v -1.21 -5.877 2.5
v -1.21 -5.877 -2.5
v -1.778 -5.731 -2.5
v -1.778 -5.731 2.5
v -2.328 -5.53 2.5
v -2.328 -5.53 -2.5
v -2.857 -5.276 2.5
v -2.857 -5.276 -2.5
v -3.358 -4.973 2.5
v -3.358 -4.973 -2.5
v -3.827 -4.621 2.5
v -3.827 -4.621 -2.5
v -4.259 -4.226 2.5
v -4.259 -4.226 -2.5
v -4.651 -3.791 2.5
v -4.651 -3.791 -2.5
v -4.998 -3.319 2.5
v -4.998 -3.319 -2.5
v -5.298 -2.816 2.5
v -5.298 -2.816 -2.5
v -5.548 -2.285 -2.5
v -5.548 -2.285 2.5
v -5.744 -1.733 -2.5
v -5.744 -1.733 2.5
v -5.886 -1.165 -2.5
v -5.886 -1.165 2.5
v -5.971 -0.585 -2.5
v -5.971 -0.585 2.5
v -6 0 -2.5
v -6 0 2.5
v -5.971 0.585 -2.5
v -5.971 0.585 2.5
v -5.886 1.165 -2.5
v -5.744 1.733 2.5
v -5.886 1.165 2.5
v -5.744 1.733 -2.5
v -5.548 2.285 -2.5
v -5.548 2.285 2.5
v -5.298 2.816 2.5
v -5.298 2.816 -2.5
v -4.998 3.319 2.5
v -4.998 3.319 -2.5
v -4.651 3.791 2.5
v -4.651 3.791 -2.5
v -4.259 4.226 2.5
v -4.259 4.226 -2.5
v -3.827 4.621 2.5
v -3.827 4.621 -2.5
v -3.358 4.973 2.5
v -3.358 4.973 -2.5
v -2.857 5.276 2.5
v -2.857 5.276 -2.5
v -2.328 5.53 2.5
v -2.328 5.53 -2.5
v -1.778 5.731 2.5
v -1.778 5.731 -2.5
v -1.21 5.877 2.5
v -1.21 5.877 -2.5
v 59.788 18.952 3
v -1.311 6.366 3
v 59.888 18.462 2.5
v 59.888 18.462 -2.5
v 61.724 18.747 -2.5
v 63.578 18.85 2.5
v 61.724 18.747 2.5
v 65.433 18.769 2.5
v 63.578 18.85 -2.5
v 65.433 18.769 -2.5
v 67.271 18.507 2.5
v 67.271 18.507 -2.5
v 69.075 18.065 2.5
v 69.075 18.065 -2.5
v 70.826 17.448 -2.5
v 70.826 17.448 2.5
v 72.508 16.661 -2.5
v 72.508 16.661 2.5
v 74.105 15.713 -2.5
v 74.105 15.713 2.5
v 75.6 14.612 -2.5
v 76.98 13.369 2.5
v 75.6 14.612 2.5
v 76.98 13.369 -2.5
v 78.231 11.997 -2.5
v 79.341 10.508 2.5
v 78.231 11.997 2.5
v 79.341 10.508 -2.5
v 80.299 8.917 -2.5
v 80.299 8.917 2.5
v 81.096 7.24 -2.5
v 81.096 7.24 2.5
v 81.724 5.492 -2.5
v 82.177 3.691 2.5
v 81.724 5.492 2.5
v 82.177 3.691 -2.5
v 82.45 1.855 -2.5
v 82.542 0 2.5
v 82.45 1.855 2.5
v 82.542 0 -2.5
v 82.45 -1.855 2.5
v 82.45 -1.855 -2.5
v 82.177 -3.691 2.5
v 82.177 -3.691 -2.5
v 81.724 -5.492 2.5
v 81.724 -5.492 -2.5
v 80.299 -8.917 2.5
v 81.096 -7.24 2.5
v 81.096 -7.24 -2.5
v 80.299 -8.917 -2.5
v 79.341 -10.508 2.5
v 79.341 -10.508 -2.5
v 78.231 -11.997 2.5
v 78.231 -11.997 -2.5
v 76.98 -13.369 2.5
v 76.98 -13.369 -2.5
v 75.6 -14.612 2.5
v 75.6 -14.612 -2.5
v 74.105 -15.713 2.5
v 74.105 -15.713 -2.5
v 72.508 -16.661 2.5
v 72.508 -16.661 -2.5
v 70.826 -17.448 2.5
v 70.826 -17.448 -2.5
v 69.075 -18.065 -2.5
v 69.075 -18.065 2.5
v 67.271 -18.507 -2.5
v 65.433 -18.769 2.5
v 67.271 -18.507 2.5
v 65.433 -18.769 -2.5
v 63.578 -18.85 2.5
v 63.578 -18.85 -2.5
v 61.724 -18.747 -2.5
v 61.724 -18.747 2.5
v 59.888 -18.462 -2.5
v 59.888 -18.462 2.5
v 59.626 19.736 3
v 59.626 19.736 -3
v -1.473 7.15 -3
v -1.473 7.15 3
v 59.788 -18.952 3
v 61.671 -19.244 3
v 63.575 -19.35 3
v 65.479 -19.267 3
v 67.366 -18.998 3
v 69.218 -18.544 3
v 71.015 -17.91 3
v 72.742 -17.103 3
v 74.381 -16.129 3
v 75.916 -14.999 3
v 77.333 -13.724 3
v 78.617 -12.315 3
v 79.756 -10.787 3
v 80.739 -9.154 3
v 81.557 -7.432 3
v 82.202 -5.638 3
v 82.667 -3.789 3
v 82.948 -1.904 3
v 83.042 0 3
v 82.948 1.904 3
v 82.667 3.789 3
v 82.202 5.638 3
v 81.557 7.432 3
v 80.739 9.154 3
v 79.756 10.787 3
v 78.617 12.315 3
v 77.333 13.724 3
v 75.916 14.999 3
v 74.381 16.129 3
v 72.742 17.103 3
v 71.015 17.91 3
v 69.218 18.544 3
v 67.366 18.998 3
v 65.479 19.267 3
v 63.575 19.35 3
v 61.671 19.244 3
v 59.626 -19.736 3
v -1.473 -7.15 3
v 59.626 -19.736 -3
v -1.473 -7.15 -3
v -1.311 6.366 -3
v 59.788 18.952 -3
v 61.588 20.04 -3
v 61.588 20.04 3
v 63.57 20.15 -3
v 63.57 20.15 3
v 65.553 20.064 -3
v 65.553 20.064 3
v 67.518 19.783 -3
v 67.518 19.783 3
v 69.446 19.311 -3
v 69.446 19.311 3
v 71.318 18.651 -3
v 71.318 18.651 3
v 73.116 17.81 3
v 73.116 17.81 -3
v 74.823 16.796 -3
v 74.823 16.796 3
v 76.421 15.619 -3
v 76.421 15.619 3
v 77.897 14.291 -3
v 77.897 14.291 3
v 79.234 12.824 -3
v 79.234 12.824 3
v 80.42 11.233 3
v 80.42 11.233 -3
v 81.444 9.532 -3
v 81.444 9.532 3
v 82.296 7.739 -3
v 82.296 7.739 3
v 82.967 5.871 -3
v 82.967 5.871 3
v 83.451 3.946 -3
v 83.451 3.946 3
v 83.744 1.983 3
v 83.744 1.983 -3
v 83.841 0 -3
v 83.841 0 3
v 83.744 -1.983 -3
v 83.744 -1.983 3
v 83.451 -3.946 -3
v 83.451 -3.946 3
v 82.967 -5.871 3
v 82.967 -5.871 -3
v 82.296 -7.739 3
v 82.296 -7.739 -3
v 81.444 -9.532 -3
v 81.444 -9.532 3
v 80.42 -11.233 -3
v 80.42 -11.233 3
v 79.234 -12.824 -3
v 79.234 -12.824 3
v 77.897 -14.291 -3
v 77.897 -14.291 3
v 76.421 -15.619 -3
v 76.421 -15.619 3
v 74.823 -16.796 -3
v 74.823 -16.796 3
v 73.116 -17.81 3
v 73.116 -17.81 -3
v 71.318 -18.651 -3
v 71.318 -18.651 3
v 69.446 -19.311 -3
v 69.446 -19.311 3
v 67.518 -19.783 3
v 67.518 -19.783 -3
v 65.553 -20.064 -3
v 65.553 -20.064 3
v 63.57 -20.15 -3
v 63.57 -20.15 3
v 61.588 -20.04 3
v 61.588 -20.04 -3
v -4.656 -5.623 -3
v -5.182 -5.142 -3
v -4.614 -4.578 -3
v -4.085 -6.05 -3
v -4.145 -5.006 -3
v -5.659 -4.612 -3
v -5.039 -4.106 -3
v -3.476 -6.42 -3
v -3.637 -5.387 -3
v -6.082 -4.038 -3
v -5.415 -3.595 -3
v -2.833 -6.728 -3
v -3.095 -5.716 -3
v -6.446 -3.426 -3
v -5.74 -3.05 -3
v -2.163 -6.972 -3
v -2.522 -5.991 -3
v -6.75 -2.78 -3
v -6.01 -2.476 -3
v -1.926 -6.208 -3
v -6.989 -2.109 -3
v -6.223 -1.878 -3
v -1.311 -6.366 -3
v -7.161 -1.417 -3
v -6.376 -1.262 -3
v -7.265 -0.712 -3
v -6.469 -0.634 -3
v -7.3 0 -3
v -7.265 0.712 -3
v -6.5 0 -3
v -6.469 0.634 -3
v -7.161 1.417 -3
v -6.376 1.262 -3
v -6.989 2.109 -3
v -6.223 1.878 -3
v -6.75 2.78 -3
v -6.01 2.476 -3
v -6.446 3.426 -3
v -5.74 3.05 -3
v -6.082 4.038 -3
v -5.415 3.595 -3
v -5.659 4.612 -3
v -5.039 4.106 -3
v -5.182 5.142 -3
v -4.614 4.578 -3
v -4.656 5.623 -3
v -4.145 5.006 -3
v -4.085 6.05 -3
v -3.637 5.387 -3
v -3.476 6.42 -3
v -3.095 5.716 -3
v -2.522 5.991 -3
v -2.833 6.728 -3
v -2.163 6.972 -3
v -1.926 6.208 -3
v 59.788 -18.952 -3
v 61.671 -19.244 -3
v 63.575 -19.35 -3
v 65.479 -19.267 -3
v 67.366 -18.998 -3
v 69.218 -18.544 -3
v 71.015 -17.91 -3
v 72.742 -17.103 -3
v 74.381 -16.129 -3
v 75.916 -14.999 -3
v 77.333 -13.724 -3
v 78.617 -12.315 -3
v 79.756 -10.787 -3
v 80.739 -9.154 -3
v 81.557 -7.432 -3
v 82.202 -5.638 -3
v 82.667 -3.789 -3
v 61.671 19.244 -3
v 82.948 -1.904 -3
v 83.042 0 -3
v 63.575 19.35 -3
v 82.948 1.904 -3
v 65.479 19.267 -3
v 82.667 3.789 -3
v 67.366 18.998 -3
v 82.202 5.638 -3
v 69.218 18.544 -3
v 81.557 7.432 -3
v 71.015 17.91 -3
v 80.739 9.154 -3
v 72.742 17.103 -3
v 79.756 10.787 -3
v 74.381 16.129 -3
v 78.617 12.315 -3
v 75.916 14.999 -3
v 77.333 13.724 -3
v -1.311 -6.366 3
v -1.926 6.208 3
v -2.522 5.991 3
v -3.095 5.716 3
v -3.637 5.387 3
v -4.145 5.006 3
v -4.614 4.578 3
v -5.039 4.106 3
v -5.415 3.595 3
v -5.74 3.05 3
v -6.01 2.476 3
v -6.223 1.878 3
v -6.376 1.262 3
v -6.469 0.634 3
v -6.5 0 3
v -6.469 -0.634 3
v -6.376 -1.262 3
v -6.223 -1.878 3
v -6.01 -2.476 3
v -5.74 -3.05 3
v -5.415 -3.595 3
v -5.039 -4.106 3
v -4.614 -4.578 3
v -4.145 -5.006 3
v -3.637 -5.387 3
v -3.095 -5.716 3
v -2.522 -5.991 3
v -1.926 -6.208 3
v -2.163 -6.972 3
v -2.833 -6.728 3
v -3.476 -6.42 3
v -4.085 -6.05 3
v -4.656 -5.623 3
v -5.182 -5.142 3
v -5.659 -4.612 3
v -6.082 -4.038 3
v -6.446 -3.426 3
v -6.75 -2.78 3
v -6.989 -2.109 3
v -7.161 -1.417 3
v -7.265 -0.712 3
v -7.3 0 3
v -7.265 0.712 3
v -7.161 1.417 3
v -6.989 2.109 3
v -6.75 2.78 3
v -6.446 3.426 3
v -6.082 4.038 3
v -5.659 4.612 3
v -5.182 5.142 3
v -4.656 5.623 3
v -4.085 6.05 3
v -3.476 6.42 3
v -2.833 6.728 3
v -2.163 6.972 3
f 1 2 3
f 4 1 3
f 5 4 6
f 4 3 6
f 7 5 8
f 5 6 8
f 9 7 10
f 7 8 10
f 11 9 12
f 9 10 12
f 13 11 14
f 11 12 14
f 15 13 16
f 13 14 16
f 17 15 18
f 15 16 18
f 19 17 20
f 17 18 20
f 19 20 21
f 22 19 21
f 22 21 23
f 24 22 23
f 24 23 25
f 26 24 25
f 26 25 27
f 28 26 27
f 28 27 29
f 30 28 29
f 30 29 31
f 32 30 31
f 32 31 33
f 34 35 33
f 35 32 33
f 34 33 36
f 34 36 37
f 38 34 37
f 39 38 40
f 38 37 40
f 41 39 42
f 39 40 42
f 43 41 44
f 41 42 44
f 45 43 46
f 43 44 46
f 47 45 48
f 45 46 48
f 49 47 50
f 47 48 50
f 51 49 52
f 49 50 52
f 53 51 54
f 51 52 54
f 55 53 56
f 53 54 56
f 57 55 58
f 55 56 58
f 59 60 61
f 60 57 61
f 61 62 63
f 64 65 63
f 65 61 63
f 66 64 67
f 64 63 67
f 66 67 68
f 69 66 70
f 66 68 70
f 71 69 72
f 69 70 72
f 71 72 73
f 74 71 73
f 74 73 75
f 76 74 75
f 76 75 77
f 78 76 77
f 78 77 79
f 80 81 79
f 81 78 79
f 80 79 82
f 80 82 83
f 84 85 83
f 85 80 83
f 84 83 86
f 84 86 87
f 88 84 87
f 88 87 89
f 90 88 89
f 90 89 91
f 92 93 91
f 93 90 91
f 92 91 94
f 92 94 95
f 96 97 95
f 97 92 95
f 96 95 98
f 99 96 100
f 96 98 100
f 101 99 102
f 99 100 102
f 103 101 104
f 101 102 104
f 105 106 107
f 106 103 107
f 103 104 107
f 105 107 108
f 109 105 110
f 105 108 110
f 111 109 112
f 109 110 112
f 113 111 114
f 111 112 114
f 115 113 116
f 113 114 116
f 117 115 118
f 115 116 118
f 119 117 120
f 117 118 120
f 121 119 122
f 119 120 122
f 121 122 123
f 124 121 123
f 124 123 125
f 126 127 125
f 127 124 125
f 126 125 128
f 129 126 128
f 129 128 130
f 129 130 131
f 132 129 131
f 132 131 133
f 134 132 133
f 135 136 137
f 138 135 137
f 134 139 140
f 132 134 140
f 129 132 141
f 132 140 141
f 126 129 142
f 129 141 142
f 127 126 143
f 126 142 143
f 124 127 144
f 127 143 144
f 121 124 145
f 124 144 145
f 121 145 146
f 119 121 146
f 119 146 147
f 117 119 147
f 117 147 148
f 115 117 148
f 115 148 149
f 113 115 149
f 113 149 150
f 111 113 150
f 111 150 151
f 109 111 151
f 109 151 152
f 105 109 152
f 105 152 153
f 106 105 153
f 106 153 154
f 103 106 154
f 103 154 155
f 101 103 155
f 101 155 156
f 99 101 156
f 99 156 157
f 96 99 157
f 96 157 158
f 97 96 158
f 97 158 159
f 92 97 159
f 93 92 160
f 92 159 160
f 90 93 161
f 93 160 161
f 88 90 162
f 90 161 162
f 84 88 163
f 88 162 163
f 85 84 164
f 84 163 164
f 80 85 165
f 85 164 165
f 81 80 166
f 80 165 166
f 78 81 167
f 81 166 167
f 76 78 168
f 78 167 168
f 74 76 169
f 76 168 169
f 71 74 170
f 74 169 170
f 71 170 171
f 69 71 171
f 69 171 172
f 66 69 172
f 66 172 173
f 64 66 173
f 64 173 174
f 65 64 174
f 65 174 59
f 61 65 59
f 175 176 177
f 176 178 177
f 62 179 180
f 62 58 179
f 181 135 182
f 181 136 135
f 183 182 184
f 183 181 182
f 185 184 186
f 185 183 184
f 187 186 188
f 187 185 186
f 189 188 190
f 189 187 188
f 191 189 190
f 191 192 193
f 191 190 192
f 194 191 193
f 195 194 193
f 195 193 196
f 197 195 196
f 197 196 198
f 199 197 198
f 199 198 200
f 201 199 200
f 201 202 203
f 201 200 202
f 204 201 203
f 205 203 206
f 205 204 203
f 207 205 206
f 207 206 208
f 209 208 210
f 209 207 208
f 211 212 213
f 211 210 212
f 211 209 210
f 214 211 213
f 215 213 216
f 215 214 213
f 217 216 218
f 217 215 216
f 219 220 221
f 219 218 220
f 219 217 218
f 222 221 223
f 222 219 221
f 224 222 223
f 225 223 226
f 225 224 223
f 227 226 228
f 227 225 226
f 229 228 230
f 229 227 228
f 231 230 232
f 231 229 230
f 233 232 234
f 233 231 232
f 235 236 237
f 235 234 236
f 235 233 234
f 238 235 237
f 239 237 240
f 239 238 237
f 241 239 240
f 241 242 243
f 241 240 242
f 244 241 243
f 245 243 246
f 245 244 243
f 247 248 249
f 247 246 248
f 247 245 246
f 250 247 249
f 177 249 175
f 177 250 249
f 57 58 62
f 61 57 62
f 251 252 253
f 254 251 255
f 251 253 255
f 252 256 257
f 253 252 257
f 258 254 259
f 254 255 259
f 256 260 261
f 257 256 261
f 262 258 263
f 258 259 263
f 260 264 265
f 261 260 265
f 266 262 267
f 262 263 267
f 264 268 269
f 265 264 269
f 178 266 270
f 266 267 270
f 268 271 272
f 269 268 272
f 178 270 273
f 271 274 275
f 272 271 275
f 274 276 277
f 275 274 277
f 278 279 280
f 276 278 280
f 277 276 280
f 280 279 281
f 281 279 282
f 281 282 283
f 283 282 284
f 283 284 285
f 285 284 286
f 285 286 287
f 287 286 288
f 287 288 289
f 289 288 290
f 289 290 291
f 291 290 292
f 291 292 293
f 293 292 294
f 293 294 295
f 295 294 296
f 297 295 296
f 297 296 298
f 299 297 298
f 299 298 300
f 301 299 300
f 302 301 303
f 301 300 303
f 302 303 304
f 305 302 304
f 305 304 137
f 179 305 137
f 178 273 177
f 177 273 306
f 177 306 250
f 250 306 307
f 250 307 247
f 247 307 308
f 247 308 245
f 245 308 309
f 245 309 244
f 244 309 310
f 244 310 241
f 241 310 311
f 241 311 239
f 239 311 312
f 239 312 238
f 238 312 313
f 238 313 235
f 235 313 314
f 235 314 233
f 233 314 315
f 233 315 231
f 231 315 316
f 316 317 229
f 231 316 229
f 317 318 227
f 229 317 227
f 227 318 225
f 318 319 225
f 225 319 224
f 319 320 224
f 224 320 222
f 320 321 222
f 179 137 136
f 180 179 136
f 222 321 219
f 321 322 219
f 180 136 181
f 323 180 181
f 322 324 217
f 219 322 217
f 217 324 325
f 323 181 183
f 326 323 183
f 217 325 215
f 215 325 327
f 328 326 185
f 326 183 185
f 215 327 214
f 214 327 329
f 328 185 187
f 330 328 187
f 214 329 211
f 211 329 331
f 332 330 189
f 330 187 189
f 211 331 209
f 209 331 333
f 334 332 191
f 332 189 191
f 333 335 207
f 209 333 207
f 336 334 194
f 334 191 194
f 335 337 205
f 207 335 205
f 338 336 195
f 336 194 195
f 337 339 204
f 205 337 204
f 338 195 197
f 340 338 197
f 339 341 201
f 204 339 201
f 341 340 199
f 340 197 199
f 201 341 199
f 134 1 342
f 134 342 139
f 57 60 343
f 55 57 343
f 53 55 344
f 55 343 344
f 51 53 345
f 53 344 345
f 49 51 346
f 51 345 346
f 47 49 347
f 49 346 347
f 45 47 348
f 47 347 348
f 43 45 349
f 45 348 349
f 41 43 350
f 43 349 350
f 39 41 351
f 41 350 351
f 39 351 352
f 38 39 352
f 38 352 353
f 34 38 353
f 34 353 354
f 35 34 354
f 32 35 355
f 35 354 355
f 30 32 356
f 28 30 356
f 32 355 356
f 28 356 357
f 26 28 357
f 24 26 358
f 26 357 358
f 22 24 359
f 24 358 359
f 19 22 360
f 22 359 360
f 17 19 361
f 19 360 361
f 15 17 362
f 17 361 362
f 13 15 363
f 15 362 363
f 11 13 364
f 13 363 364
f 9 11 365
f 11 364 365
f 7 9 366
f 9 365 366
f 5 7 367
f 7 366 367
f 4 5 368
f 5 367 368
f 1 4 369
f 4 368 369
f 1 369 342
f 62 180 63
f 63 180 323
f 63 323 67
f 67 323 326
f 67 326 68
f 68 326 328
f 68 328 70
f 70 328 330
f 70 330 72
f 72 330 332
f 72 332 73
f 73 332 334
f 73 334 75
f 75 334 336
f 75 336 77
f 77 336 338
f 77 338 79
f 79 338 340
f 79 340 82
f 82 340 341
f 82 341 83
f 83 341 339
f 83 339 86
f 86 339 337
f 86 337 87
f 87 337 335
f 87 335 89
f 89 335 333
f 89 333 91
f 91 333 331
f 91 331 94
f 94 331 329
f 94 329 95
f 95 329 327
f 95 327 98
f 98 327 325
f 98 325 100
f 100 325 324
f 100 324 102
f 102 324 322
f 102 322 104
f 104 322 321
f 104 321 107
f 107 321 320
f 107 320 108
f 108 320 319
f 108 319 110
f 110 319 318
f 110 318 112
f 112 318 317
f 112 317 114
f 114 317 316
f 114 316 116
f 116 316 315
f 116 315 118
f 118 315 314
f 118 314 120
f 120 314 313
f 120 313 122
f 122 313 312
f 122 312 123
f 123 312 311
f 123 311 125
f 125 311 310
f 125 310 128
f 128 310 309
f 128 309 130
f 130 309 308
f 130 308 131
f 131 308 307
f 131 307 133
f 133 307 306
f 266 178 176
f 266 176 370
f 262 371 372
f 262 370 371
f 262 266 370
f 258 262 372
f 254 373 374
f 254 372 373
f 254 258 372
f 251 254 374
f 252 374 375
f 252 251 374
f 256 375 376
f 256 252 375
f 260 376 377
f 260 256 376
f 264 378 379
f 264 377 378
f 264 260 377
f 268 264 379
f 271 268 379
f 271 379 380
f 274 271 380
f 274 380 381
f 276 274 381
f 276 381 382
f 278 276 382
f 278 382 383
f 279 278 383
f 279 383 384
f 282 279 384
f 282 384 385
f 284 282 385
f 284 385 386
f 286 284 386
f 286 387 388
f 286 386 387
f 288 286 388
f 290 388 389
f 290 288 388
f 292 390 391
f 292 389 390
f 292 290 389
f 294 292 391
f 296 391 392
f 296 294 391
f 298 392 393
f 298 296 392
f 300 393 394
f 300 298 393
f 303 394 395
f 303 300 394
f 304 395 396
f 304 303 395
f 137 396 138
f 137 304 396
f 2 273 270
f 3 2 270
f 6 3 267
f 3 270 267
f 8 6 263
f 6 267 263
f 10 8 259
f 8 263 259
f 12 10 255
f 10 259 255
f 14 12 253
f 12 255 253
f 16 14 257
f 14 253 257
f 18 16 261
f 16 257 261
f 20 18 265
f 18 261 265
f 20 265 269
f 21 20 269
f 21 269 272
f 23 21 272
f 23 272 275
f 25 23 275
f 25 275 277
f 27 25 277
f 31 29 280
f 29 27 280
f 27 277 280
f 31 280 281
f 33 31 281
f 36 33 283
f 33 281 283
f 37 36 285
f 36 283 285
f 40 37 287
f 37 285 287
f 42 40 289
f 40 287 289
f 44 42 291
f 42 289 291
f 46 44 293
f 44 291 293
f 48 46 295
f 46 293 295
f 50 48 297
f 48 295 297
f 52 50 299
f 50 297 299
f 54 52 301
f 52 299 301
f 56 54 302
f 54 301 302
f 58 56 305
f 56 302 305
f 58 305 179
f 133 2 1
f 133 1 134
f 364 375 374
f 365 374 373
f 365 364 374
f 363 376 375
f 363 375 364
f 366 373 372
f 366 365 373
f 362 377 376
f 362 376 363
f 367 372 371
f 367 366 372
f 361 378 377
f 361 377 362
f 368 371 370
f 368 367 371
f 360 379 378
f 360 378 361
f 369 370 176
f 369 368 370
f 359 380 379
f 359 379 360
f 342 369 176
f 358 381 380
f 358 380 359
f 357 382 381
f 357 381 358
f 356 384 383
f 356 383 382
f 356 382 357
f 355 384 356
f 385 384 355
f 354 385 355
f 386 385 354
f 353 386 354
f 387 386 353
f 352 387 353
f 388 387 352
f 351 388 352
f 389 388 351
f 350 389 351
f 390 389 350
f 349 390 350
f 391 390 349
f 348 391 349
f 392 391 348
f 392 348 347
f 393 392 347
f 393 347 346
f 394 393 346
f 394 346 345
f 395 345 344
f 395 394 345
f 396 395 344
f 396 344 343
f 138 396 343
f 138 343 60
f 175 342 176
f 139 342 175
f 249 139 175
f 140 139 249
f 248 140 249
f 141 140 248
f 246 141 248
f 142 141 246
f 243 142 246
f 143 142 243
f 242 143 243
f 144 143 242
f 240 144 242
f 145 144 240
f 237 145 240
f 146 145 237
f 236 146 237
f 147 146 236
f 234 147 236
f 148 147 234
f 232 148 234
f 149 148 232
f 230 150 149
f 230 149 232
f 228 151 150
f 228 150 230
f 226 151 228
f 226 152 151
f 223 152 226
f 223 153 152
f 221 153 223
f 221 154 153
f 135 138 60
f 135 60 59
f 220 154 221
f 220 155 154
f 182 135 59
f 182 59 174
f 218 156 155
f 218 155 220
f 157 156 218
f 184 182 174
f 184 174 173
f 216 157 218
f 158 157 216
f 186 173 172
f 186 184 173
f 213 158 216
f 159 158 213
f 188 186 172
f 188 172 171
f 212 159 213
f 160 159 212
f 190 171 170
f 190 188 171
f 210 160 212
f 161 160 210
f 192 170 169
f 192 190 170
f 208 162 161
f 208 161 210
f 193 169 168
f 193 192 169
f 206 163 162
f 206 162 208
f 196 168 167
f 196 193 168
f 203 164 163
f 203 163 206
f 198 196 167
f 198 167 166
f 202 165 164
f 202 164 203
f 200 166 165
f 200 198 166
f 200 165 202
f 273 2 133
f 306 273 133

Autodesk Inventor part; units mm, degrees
ref_plane "YZ Plane" through (0, 0, 0) normal (1, 0, 0) x (0, 1, 0)
ref_plane "XZ Plane" through (0, 0, 0) normal (0, 1, 0) x (-1, 0, 0)
ref_plane "XY Plane" through (0, 0, 0) normal (0, 0, 1) x (1, 0, 0)
sketch "Sketch1" plane through (0, 0, 0) normal (0, 0, 1) x (1, 0, 0)
  arc A0 (-1.2105, 5.8766) -> (-1.2105, -5.8766) centre (0, 0) ccw
  arc A1 (59.8885, -18.4624) -> (59.8885, 18.4624) centre (63.6915, 0) ccw
  line L0 (-1.2105, 5.8766) -> (59.8885, 18.4624)
  line L1 (-1.2105, -5.8766) -> (59.8885, -18.4624)
  line L2 (59.6262, 19.7356) -> (-1.4728, 7.1499)
  arc A2 (-1.4728, 7.1499) -> (-1.4728, -7.1499) centre (0, 0) ccw
  line L3 (-1.4728, -7.1499) -> (59.6262, -19.7356)
  arc A3 (59.6262, -19.7356) -> (59.6262, 19.7356) centre (63.6915, 0) ccw
  dimension "d0" = 12
  dimension "d1" = 37.7
  dimension "d3" = 1.3
  dimension "d9" = 63.6915
extrude "Extrusion1" add sketch "Sketch1" along normal mid plane 6
chamfer "Chamfer1" distance 0.5 angle 45 8 edges at (-6, 0, 3) (29.339, 12.1695, 3) (82.5415, 0, 3) (29.339, -12.1695, 3) (-6, 0, -3) (29.339, -12.1695, -3) (82.5415, 0, -3) (29.339, 12.1695, -3)
properties part number "Tandriem16naar60T" material "Rubber"
